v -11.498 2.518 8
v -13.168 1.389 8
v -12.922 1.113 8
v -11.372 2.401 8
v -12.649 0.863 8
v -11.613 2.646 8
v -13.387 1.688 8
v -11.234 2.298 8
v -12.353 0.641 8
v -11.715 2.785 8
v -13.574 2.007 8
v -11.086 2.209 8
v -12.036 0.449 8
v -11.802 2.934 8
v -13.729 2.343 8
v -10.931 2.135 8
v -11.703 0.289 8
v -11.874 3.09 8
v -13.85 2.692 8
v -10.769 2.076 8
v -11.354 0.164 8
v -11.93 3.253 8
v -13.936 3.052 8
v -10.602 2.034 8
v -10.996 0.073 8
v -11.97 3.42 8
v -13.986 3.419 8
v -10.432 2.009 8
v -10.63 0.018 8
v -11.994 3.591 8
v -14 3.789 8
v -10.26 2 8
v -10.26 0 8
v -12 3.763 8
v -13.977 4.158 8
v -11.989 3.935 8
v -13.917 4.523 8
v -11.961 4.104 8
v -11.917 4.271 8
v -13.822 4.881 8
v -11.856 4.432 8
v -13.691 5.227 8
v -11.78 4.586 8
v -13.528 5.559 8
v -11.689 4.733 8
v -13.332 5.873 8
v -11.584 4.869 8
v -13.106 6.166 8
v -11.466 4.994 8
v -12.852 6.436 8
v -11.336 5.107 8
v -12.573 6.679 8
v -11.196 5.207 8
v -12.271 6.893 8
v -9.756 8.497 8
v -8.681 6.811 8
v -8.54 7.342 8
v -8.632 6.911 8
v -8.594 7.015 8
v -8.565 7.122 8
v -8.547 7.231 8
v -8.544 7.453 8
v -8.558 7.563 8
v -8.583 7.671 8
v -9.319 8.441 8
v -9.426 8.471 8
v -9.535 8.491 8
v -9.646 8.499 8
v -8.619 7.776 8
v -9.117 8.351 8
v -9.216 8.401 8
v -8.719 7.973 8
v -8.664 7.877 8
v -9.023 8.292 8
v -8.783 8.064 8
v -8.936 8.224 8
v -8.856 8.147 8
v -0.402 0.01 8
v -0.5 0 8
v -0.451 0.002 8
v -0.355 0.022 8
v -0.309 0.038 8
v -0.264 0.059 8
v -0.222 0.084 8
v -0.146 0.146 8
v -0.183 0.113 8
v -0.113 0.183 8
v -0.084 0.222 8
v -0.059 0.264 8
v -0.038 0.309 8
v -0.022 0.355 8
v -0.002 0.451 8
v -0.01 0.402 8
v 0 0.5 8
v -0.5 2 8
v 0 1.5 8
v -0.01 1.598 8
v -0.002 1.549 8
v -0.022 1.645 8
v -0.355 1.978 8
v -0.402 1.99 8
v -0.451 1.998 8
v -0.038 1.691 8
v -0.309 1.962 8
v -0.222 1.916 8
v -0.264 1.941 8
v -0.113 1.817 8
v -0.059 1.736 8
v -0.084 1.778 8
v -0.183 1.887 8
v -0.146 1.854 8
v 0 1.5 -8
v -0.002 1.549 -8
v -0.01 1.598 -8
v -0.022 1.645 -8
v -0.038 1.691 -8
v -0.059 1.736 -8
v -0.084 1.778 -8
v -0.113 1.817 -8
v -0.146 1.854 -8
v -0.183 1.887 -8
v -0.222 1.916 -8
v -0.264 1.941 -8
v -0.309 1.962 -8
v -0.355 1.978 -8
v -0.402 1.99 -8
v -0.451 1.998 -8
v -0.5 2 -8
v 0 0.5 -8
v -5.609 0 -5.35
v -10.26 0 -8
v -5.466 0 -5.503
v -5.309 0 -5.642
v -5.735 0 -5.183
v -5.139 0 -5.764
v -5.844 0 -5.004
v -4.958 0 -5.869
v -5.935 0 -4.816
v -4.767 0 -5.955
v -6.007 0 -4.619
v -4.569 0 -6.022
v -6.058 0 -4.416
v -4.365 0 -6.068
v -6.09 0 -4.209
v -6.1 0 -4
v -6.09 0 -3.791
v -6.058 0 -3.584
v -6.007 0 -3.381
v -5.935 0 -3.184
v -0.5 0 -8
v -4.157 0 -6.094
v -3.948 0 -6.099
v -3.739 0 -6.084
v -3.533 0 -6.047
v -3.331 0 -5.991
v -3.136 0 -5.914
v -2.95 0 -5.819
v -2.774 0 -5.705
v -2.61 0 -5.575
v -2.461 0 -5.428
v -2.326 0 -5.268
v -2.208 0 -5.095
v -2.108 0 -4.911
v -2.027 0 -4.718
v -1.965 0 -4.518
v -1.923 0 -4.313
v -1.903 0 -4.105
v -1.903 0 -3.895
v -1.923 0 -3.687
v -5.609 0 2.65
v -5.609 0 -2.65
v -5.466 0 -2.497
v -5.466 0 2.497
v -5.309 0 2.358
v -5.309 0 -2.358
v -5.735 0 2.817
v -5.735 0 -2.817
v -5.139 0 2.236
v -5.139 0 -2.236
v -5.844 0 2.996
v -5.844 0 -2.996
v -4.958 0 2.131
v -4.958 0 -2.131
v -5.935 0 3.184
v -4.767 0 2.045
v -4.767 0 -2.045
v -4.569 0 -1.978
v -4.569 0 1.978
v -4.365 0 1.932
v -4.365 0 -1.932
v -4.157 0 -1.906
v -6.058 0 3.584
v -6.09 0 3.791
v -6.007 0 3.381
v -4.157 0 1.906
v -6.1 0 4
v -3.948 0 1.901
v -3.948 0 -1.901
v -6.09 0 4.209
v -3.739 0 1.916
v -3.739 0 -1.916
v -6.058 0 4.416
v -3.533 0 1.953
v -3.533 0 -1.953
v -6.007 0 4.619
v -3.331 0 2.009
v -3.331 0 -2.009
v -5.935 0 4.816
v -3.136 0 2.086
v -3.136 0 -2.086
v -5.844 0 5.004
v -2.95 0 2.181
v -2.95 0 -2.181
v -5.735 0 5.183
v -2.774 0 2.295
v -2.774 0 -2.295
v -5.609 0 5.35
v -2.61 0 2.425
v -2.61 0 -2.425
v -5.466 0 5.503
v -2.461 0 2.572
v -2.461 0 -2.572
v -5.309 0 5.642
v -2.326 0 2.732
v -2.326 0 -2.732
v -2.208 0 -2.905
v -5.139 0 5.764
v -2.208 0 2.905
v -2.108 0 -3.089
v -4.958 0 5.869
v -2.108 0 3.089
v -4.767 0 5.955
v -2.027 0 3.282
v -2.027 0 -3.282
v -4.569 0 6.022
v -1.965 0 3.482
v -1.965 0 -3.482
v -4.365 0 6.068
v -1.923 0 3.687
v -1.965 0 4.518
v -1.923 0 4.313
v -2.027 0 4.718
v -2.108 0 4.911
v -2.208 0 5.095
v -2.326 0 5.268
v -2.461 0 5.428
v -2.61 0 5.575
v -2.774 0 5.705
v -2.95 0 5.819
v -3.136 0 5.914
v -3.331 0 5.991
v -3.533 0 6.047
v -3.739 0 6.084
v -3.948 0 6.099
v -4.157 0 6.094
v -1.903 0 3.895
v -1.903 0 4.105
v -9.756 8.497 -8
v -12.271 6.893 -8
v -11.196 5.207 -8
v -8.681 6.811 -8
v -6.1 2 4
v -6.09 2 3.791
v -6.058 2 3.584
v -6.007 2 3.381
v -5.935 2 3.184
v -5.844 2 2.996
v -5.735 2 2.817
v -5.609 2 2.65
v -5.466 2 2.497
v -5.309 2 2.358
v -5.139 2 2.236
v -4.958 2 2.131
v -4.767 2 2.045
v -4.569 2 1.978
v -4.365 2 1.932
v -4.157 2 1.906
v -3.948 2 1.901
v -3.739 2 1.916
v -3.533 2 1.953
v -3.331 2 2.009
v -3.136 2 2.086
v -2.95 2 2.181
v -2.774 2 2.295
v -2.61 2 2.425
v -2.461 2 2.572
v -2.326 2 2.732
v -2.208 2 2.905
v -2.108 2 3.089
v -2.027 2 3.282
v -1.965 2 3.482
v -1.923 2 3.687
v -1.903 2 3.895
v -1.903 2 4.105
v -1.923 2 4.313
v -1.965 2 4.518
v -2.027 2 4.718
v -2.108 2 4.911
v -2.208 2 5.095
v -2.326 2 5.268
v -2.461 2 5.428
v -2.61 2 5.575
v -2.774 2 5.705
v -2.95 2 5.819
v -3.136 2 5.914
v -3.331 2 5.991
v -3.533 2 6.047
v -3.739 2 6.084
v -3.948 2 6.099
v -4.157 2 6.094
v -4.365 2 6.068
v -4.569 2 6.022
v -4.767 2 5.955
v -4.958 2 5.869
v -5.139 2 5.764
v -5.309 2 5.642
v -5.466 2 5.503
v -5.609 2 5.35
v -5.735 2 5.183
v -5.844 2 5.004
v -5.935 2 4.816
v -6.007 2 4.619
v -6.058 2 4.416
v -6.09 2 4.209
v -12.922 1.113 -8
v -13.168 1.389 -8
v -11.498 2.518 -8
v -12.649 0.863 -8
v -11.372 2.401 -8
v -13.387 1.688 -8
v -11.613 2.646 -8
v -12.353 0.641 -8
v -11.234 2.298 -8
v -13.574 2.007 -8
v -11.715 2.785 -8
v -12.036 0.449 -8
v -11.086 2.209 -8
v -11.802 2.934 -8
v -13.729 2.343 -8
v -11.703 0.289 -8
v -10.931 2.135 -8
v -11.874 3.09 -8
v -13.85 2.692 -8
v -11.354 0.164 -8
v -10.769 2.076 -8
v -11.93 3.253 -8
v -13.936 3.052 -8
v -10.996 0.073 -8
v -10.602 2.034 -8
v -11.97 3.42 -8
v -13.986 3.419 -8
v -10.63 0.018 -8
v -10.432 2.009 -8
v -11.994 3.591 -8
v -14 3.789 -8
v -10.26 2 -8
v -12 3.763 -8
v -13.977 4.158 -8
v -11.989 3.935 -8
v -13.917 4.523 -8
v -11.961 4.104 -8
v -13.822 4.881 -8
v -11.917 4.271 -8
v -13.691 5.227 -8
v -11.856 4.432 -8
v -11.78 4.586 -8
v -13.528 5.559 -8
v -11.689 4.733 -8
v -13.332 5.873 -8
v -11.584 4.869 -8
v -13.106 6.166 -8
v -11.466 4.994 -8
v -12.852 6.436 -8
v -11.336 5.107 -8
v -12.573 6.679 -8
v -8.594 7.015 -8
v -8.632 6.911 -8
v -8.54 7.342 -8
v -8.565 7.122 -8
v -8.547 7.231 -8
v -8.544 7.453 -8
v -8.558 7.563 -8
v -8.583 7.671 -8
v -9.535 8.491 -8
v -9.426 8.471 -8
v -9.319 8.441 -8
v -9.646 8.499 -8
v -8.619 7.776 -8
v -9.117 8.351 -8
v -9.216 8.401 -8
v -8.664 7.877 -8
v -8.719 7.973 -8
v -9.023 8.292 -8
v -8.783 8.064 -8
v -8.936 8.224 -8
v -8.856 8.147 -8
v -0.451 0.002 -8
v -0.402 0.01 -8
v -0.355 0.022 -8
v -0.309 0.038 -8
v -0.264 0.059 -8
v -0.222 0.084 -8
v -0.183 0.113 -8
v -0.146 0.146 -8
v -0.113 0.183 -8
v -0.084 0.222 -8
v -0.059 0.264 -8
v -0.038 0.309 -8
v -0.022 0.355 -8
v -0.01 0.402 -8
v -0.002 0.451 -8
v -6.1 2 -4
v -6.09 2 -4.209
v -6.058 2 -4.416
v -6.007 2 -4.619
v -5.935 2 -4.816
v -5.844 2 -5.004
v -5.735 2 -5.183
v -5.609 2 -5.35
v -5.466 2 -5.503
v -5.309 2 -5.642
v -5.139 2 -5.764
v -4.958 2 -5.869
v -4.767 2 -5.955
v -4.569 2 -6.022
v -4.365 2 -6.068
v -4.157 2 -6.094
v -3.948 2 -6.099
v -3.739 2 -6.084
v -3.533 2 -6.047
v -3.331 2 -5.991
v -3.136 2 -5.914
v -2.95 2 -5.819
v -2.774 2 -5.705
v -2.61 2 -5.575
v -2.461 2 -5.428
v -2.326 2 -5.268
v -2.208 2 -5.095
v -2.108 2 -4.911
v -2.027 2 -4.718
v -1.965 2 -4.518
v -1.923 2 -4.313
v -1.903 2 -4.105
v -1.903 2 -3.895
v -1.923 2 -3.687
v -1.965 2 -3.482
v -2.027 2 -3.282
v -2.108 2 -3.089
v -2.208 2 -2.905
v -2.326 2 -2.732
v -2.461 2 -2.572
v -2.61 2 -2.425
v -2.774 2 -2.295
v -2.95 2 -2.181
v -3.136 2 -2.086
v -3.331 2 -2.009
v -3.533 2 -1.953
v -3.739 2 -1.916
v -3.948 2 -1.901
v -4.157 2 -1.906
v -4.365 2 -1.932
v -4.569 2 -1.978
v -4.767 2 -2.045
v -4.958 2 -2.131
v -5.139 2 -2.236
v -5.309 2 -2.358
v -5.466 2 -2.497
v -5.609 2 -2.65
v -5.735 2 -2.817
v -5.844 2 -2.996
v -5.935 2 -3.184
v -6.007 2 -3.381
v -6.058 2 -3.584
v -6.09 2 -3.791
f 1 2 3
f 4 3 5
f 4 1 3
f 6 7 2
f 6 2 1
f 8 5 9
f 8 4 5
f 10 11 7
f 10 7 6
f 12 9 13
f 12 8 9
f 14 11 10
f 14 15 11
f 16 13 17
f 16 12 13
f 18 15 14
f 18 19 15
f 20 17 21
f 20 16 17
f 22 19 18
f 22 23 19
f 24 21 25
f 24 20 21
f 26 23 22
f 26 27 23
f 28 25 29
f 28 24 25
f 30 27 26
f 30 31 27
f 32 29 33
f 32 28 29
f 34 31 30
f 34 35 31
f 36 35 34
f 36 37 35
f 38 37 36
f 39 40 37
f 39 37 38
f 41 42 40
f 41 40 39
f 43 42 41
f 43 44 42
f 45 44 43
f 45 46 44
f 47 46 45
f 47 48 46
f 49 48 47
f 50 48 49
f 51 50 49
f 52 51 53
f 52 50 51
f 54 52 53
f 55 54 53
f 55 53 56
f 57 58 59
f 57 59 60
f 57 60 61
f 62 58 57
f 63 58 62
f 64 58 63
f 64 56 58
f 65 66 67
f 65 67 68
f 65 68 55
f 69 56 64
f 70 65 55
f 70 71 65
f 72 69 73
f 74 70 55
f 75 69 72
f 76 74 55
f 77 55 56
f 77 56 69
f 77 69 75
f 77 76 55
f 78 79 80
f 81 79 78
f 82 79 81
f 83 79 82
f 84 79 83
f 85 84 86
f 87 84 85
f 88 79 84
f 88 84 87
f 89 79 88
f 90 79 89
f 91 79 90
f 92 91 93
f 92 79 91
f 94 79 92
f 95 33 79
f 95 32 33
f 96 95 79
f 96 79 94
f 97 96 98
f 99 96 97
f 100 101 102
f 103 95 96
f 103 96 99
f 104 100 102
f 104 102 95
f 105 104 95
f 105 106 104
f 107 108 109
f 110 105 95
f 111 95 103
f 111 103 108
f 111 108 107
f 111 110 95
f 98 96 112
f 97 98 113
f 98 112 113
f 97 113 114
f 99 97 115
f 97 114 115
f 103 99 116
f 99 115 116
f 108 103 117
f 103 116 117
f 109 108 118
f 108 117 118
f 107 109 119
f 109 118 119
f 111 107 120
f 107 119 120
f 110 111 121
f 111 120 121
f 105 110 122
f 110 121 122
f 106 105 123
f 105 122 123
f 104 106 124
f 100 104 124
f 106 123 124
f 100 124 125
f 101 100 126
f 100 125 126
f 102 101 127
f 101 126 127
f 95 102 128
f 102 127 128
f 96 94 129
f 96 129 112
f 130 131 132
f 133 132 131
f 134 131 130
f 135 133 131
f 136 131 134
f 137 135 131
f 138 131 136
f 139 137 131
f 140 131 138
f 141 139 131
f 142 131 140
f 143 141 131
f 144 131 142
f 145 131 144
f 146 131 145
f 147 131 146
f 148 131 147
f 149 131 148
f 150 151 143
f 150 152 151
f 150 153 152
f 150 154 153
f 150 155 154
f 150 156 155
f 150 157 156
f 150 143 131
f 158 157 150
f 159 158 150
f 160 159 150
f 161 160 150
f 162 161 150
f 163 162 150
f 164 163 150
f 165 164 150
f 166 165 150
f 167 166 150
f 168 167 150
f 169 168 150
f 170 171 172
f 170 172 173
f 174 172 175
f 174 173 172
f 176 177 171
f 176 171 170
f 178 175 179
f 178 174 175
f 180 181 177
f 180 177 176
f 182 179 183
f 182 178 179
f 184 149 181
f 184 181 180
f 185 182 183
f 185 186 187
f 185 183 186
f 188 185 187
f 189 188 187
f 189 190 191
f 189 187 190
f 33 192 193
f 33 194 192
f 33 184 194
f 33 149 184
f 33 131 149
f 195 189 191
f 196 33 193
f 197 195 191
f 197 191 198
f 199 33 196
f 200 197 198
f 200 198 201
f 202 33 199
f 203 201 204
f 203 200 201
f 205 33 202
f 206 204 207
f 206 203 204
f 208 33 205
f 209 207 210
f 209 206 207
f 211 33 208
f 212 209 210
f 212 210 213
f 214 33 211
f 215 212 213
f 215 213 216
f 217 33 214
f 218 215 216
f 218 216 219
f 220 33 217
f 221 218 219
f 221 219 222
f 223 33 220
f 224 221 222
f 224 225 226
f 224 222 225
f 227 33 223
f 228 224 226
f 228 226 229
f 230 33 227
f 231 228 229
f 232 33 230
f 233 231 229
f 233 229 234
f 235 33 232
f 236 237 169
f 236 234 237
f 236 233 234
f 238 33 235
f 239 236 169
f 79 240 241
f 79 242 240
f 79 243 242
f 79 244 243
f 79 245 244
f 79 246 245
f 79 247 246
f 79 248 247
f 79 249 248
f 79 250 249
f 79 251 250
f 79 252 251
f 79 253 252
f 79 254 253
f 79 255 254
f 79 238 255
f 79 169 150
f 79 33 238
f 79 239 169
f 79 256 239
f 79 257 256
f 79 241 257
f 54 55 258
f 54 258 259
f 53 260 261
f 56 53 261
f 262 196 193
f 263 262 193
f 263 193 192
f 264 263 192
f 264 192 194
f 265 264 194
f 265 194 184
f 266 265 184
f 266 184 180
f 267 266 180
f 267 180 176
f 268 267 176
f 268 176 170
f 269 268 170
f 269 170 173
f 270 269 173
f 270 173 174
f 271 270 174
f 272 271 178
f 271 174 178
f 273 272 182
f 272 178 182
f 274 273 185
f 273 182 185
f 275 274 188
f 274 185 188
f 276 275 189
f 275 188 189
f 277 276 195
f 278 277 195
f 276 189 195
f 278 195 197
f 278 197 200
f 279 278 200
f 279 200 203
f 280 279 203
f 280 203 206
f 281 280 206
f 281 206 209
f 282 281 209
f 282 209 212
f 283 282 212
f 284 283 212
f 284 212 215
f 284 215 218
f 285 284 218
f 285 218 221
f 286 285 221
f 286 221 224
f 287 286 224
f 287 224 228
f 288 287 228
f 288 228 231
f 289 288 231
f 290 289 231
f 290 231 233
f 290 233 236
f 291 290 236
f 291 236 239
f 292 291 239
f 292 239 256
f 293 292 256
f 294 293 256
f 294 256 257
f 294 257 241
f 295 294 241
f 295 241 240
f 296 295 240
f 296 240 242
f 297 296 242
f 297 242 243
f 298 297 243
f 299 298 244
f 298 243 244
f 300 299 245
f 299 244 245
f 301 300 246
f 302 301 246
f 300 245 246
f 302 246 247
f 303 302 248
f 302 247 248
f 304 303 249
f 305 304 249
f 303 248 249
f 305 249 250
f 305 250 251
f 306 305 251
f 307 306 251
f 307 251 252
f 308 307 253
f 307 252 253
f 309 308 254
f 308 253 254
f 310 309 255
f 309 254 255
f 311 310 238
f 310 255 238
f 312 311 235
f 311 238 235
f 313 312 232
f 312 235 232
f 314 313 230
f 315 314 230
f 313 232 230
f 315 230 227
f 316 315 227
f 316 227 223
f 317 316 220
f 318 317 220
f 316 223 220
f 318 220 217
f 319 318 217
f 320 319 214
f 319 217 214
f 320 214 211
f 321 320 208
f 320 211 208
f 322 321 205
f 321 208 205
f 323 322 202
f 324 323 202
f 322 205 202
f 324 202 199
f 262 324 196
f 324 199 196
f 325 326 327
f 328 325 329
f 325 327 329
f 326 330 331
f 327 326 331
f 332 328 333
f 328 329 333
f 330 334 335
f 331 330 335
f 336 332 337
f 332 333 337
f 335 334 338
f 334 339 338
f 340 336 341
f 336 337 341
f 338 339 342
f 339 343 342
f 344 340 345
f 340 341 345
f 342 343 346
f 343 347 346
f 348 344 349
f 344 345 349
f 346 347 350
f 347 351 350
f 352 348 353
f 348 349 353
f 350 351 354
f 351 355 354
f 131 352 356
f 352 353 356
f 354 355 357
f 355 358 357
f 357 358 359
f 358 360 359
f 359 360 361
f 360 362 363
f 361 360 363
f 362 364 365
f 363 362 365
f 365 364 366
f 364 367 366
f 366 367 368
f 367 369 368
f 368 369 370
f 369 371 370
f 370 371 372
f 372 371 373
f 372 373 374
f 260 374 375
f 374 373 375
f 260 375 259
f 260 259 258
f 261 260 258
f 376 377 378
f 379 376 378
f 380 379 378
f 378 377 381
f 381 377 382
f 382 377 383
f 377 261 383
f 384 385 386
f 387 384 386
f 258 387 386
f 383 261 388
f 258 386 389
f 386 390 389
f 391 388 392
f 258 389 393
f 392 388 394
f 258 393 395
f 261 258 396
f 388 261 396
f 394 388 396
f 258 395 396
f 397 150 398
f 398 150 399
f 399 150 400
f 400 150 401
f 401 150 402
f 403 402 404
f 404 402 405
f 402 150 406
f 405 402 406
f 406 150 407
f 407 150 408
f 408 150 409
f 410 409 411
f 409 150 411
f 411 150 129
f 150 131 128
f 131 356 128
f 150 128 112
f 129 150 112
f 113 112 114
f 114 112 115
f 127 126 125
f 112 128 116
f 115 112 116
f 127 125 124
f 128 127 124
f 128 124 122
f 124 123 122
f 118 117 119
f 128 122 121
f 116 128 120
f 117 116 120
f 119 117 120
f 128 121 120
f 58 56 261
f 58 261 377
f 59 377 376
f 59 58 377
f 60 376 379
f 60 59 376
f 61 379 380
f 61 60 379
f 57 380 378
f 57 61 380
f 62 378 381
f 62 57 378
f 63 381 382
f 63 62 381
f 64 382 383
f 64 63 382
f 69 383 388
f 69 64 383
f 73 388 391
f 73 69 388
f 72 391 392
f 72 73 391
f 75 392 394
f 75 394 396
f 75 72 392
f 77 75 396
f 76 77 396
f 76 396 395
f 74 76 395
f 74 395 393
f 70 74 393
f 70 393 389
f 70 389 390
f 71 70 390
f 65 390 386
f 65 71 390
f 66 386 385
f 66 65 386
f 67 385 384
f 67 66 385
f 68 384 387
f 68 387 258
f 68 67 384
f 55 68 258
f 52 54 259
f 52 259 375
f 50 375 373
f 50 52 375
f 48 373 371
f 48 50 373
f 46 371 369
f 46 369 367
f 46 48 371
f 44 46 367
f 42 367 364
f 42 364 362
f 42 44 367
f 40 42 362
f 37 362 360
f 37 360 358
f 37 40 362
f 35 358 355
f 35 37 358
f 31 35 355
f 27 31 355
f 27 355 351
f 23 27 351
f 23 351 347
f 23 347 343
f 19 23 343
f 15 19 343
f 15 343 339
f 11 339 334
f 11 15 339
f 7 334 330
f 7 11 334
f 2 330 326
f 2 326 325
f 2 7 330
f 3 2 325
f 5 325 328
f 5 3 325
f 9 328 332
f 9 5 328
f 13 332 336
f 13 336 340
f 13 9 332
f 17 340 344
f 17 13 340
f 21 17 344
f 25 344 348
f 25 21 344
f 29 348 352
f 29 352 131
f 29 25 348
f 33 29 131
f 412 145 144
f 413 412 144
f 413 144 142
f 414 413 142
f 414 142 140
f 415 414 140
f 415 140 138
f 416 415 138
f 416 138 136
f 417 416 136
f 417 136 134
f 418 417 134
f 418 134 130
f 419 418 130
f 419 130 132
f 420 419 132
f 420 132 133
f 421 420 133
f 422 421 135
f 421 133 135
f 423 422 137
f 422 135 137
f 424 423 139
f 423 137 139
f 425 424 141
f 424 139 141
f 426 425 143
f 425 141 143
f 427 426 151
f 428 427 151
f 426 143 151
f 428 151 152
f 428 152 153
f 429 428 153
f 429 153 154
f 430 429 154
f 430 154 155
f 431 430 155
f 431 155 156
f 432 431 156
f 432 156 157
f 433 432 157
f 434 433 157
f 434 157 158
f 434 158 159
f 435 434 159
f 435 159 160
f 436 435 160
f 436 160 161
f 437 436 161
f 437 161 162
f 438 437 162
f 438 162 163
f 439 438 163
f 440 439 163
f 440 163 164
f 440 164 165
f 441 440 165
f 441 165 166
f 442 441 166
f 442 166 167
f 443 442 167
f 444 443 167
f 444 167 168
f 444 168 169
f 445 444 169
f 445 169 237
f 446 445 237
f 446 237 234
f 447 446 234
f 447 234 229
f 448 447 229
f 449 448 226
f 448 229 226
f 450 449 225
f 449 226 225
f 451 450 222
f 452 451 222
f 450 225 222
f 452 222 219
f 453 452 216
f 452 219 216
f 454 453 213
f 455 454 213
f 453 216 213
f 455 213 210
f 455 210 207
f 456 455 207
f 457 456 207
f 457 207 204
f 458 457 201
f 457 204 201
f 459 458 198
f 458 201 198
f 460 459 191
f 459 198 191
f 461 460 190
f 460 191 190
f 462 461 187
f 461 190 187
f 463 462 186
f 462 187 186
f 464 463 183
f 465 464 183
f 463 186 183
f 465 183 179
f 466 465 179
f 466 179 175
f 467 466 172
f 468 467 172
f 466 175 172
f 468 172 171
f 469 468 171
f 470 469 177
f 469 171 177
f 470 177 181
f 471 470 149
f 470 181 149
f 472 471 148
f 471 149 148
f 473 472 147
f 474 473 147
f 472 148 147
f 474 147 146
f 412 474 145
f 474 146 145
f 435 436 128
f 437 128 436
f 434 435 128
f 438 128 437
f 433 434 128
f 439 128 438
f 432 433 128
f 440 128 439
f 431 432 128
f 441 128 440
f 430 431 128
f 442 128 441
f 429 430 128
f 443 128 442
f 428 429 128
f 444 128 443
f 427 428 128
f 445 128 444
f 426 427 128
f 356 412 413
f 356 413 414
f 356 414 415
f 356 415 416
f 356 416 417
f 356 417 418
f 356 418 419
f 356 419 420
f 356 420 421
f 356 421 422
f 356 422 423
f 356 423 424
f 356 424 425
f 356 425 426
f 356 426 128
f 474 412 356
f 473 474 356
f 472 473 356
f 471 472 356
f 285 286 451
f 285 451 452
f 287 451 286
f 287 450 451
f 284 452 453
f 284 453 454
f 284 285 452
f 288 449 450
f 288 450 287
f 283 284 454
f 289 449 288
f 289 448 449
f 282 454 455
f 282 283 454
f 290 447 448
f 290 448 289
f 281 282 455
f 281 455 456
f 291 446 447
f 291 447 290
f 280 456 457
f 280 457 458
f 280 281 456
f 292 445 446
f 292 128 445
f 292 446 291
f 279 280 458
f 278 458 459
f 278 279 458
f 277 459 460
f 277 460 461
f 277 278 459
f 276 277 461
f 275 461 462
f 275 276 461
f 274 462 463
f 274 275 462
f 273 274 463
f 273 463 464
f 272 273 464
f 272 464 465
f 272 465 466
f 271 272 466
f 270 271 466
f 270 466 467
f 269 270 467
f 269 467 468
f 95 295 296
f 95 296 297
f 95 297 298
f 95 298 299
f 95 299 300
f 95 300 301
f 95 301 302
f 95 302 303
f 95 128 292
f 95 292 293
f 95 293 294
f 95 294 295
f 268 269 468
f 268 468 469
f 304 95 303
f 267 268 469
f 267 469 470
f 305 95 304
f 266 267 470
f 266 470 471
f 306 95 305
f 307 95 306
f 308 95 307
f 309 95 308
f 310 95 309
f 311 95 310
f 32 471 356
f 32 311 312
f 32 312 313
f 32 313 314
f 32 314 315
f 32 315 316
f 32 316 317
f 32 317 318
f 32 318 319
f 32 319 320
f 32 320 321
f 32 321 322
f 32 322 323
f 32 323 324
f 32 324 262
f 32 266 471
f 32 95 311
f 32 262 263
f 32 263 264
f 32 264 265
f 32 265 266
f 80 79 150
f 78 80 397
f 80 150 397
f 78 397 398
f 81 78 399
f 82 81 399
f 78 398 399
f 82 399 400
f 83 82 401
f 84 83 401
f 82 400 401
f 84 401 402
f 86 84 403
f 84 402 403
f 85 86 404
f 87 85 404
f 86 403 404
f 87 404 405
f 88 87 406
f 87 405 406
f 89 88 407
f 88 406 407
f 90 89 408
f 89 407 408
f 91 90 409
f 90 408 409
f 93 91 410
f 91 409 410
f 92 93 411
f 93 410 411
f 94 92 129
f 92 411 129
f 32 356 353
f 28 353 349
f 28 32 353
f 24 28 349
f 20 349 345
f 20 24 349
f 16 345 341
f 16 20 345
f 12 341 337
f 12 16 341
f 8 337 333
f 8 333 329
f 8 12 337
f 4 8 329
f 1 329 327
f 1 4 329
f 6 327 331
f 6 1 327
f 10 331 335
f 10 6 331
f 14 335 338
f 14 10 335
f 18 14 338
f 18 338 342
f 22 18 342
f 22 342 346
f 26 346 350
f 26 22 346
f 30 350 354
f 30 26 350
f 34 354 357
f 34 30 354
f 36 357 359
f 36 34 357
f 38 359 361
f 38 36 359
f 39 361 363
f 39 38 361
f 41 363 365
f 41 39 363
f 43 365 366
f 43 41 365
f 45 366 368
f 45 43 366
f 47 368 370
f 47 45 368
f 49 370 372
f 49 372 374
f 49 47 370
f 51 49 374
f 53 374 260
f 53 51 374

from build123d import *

# Parameters (mm, degrees)
EXTRUDE_1_DEPTH         = 16
HOLE_WIZARD_4_2_4_2_1_D = 4.2
FILLET_1_R              = 0.5


with BuildPart() as part:
    # Эскиз1 → Бобышка-Вытянуть1 (new body)
    with BuildSketch(Plane.XY.offset(8)):
        with BuildLine():
            Line((-9.756337345, 8.497441256), (-12.271369771, 6.893092394))
            ThreePointArc((-12.271369771, 6.893092394), (-13.850276142, 2.692375438), (-10.26, 0))
            Line((-10.26, 0), (0, 0))
            Line((0, 0), (0, 2))
            Line((0, 2), (-10.26, 2))
            ThreePointArc((-10.26, 2), (-11.930342376, 3.252602477), (-11.195770963, 5.206946729))
            Line((-11.195770963, 5.206946729), (-8.680738537, 6.81129559))
            ThreePointArc((-8.680738537, 6.81129559), (-8.718896971, 7.97309132), (-9.756337345, 8.497441256))
        make_face()
    extrude(amount=-EXTRUDE_1_DEPTH)

    # Диаметр отверстия Ø4.2 (4.2)1 (through all)
    with Locations(Plane(origin=(0, 2, 0), x_dir=(1, 0, 0), z_dir=(0, 1, 0))):
        with Locations((-4, 4), (-4, -4)):
            Hole(HOLE_WIZARD_4_2_4_2_1_D / 2)

    # Скругление1
    fillet_1_edges = [part.edges().sort_by_distance(p)[0] for p in [
        (0, 2, 0),
        (0, 0, 0),
    ]]
    fillet(fillet_1_edges, radius=FILLET_1_R)


solid = part.part
